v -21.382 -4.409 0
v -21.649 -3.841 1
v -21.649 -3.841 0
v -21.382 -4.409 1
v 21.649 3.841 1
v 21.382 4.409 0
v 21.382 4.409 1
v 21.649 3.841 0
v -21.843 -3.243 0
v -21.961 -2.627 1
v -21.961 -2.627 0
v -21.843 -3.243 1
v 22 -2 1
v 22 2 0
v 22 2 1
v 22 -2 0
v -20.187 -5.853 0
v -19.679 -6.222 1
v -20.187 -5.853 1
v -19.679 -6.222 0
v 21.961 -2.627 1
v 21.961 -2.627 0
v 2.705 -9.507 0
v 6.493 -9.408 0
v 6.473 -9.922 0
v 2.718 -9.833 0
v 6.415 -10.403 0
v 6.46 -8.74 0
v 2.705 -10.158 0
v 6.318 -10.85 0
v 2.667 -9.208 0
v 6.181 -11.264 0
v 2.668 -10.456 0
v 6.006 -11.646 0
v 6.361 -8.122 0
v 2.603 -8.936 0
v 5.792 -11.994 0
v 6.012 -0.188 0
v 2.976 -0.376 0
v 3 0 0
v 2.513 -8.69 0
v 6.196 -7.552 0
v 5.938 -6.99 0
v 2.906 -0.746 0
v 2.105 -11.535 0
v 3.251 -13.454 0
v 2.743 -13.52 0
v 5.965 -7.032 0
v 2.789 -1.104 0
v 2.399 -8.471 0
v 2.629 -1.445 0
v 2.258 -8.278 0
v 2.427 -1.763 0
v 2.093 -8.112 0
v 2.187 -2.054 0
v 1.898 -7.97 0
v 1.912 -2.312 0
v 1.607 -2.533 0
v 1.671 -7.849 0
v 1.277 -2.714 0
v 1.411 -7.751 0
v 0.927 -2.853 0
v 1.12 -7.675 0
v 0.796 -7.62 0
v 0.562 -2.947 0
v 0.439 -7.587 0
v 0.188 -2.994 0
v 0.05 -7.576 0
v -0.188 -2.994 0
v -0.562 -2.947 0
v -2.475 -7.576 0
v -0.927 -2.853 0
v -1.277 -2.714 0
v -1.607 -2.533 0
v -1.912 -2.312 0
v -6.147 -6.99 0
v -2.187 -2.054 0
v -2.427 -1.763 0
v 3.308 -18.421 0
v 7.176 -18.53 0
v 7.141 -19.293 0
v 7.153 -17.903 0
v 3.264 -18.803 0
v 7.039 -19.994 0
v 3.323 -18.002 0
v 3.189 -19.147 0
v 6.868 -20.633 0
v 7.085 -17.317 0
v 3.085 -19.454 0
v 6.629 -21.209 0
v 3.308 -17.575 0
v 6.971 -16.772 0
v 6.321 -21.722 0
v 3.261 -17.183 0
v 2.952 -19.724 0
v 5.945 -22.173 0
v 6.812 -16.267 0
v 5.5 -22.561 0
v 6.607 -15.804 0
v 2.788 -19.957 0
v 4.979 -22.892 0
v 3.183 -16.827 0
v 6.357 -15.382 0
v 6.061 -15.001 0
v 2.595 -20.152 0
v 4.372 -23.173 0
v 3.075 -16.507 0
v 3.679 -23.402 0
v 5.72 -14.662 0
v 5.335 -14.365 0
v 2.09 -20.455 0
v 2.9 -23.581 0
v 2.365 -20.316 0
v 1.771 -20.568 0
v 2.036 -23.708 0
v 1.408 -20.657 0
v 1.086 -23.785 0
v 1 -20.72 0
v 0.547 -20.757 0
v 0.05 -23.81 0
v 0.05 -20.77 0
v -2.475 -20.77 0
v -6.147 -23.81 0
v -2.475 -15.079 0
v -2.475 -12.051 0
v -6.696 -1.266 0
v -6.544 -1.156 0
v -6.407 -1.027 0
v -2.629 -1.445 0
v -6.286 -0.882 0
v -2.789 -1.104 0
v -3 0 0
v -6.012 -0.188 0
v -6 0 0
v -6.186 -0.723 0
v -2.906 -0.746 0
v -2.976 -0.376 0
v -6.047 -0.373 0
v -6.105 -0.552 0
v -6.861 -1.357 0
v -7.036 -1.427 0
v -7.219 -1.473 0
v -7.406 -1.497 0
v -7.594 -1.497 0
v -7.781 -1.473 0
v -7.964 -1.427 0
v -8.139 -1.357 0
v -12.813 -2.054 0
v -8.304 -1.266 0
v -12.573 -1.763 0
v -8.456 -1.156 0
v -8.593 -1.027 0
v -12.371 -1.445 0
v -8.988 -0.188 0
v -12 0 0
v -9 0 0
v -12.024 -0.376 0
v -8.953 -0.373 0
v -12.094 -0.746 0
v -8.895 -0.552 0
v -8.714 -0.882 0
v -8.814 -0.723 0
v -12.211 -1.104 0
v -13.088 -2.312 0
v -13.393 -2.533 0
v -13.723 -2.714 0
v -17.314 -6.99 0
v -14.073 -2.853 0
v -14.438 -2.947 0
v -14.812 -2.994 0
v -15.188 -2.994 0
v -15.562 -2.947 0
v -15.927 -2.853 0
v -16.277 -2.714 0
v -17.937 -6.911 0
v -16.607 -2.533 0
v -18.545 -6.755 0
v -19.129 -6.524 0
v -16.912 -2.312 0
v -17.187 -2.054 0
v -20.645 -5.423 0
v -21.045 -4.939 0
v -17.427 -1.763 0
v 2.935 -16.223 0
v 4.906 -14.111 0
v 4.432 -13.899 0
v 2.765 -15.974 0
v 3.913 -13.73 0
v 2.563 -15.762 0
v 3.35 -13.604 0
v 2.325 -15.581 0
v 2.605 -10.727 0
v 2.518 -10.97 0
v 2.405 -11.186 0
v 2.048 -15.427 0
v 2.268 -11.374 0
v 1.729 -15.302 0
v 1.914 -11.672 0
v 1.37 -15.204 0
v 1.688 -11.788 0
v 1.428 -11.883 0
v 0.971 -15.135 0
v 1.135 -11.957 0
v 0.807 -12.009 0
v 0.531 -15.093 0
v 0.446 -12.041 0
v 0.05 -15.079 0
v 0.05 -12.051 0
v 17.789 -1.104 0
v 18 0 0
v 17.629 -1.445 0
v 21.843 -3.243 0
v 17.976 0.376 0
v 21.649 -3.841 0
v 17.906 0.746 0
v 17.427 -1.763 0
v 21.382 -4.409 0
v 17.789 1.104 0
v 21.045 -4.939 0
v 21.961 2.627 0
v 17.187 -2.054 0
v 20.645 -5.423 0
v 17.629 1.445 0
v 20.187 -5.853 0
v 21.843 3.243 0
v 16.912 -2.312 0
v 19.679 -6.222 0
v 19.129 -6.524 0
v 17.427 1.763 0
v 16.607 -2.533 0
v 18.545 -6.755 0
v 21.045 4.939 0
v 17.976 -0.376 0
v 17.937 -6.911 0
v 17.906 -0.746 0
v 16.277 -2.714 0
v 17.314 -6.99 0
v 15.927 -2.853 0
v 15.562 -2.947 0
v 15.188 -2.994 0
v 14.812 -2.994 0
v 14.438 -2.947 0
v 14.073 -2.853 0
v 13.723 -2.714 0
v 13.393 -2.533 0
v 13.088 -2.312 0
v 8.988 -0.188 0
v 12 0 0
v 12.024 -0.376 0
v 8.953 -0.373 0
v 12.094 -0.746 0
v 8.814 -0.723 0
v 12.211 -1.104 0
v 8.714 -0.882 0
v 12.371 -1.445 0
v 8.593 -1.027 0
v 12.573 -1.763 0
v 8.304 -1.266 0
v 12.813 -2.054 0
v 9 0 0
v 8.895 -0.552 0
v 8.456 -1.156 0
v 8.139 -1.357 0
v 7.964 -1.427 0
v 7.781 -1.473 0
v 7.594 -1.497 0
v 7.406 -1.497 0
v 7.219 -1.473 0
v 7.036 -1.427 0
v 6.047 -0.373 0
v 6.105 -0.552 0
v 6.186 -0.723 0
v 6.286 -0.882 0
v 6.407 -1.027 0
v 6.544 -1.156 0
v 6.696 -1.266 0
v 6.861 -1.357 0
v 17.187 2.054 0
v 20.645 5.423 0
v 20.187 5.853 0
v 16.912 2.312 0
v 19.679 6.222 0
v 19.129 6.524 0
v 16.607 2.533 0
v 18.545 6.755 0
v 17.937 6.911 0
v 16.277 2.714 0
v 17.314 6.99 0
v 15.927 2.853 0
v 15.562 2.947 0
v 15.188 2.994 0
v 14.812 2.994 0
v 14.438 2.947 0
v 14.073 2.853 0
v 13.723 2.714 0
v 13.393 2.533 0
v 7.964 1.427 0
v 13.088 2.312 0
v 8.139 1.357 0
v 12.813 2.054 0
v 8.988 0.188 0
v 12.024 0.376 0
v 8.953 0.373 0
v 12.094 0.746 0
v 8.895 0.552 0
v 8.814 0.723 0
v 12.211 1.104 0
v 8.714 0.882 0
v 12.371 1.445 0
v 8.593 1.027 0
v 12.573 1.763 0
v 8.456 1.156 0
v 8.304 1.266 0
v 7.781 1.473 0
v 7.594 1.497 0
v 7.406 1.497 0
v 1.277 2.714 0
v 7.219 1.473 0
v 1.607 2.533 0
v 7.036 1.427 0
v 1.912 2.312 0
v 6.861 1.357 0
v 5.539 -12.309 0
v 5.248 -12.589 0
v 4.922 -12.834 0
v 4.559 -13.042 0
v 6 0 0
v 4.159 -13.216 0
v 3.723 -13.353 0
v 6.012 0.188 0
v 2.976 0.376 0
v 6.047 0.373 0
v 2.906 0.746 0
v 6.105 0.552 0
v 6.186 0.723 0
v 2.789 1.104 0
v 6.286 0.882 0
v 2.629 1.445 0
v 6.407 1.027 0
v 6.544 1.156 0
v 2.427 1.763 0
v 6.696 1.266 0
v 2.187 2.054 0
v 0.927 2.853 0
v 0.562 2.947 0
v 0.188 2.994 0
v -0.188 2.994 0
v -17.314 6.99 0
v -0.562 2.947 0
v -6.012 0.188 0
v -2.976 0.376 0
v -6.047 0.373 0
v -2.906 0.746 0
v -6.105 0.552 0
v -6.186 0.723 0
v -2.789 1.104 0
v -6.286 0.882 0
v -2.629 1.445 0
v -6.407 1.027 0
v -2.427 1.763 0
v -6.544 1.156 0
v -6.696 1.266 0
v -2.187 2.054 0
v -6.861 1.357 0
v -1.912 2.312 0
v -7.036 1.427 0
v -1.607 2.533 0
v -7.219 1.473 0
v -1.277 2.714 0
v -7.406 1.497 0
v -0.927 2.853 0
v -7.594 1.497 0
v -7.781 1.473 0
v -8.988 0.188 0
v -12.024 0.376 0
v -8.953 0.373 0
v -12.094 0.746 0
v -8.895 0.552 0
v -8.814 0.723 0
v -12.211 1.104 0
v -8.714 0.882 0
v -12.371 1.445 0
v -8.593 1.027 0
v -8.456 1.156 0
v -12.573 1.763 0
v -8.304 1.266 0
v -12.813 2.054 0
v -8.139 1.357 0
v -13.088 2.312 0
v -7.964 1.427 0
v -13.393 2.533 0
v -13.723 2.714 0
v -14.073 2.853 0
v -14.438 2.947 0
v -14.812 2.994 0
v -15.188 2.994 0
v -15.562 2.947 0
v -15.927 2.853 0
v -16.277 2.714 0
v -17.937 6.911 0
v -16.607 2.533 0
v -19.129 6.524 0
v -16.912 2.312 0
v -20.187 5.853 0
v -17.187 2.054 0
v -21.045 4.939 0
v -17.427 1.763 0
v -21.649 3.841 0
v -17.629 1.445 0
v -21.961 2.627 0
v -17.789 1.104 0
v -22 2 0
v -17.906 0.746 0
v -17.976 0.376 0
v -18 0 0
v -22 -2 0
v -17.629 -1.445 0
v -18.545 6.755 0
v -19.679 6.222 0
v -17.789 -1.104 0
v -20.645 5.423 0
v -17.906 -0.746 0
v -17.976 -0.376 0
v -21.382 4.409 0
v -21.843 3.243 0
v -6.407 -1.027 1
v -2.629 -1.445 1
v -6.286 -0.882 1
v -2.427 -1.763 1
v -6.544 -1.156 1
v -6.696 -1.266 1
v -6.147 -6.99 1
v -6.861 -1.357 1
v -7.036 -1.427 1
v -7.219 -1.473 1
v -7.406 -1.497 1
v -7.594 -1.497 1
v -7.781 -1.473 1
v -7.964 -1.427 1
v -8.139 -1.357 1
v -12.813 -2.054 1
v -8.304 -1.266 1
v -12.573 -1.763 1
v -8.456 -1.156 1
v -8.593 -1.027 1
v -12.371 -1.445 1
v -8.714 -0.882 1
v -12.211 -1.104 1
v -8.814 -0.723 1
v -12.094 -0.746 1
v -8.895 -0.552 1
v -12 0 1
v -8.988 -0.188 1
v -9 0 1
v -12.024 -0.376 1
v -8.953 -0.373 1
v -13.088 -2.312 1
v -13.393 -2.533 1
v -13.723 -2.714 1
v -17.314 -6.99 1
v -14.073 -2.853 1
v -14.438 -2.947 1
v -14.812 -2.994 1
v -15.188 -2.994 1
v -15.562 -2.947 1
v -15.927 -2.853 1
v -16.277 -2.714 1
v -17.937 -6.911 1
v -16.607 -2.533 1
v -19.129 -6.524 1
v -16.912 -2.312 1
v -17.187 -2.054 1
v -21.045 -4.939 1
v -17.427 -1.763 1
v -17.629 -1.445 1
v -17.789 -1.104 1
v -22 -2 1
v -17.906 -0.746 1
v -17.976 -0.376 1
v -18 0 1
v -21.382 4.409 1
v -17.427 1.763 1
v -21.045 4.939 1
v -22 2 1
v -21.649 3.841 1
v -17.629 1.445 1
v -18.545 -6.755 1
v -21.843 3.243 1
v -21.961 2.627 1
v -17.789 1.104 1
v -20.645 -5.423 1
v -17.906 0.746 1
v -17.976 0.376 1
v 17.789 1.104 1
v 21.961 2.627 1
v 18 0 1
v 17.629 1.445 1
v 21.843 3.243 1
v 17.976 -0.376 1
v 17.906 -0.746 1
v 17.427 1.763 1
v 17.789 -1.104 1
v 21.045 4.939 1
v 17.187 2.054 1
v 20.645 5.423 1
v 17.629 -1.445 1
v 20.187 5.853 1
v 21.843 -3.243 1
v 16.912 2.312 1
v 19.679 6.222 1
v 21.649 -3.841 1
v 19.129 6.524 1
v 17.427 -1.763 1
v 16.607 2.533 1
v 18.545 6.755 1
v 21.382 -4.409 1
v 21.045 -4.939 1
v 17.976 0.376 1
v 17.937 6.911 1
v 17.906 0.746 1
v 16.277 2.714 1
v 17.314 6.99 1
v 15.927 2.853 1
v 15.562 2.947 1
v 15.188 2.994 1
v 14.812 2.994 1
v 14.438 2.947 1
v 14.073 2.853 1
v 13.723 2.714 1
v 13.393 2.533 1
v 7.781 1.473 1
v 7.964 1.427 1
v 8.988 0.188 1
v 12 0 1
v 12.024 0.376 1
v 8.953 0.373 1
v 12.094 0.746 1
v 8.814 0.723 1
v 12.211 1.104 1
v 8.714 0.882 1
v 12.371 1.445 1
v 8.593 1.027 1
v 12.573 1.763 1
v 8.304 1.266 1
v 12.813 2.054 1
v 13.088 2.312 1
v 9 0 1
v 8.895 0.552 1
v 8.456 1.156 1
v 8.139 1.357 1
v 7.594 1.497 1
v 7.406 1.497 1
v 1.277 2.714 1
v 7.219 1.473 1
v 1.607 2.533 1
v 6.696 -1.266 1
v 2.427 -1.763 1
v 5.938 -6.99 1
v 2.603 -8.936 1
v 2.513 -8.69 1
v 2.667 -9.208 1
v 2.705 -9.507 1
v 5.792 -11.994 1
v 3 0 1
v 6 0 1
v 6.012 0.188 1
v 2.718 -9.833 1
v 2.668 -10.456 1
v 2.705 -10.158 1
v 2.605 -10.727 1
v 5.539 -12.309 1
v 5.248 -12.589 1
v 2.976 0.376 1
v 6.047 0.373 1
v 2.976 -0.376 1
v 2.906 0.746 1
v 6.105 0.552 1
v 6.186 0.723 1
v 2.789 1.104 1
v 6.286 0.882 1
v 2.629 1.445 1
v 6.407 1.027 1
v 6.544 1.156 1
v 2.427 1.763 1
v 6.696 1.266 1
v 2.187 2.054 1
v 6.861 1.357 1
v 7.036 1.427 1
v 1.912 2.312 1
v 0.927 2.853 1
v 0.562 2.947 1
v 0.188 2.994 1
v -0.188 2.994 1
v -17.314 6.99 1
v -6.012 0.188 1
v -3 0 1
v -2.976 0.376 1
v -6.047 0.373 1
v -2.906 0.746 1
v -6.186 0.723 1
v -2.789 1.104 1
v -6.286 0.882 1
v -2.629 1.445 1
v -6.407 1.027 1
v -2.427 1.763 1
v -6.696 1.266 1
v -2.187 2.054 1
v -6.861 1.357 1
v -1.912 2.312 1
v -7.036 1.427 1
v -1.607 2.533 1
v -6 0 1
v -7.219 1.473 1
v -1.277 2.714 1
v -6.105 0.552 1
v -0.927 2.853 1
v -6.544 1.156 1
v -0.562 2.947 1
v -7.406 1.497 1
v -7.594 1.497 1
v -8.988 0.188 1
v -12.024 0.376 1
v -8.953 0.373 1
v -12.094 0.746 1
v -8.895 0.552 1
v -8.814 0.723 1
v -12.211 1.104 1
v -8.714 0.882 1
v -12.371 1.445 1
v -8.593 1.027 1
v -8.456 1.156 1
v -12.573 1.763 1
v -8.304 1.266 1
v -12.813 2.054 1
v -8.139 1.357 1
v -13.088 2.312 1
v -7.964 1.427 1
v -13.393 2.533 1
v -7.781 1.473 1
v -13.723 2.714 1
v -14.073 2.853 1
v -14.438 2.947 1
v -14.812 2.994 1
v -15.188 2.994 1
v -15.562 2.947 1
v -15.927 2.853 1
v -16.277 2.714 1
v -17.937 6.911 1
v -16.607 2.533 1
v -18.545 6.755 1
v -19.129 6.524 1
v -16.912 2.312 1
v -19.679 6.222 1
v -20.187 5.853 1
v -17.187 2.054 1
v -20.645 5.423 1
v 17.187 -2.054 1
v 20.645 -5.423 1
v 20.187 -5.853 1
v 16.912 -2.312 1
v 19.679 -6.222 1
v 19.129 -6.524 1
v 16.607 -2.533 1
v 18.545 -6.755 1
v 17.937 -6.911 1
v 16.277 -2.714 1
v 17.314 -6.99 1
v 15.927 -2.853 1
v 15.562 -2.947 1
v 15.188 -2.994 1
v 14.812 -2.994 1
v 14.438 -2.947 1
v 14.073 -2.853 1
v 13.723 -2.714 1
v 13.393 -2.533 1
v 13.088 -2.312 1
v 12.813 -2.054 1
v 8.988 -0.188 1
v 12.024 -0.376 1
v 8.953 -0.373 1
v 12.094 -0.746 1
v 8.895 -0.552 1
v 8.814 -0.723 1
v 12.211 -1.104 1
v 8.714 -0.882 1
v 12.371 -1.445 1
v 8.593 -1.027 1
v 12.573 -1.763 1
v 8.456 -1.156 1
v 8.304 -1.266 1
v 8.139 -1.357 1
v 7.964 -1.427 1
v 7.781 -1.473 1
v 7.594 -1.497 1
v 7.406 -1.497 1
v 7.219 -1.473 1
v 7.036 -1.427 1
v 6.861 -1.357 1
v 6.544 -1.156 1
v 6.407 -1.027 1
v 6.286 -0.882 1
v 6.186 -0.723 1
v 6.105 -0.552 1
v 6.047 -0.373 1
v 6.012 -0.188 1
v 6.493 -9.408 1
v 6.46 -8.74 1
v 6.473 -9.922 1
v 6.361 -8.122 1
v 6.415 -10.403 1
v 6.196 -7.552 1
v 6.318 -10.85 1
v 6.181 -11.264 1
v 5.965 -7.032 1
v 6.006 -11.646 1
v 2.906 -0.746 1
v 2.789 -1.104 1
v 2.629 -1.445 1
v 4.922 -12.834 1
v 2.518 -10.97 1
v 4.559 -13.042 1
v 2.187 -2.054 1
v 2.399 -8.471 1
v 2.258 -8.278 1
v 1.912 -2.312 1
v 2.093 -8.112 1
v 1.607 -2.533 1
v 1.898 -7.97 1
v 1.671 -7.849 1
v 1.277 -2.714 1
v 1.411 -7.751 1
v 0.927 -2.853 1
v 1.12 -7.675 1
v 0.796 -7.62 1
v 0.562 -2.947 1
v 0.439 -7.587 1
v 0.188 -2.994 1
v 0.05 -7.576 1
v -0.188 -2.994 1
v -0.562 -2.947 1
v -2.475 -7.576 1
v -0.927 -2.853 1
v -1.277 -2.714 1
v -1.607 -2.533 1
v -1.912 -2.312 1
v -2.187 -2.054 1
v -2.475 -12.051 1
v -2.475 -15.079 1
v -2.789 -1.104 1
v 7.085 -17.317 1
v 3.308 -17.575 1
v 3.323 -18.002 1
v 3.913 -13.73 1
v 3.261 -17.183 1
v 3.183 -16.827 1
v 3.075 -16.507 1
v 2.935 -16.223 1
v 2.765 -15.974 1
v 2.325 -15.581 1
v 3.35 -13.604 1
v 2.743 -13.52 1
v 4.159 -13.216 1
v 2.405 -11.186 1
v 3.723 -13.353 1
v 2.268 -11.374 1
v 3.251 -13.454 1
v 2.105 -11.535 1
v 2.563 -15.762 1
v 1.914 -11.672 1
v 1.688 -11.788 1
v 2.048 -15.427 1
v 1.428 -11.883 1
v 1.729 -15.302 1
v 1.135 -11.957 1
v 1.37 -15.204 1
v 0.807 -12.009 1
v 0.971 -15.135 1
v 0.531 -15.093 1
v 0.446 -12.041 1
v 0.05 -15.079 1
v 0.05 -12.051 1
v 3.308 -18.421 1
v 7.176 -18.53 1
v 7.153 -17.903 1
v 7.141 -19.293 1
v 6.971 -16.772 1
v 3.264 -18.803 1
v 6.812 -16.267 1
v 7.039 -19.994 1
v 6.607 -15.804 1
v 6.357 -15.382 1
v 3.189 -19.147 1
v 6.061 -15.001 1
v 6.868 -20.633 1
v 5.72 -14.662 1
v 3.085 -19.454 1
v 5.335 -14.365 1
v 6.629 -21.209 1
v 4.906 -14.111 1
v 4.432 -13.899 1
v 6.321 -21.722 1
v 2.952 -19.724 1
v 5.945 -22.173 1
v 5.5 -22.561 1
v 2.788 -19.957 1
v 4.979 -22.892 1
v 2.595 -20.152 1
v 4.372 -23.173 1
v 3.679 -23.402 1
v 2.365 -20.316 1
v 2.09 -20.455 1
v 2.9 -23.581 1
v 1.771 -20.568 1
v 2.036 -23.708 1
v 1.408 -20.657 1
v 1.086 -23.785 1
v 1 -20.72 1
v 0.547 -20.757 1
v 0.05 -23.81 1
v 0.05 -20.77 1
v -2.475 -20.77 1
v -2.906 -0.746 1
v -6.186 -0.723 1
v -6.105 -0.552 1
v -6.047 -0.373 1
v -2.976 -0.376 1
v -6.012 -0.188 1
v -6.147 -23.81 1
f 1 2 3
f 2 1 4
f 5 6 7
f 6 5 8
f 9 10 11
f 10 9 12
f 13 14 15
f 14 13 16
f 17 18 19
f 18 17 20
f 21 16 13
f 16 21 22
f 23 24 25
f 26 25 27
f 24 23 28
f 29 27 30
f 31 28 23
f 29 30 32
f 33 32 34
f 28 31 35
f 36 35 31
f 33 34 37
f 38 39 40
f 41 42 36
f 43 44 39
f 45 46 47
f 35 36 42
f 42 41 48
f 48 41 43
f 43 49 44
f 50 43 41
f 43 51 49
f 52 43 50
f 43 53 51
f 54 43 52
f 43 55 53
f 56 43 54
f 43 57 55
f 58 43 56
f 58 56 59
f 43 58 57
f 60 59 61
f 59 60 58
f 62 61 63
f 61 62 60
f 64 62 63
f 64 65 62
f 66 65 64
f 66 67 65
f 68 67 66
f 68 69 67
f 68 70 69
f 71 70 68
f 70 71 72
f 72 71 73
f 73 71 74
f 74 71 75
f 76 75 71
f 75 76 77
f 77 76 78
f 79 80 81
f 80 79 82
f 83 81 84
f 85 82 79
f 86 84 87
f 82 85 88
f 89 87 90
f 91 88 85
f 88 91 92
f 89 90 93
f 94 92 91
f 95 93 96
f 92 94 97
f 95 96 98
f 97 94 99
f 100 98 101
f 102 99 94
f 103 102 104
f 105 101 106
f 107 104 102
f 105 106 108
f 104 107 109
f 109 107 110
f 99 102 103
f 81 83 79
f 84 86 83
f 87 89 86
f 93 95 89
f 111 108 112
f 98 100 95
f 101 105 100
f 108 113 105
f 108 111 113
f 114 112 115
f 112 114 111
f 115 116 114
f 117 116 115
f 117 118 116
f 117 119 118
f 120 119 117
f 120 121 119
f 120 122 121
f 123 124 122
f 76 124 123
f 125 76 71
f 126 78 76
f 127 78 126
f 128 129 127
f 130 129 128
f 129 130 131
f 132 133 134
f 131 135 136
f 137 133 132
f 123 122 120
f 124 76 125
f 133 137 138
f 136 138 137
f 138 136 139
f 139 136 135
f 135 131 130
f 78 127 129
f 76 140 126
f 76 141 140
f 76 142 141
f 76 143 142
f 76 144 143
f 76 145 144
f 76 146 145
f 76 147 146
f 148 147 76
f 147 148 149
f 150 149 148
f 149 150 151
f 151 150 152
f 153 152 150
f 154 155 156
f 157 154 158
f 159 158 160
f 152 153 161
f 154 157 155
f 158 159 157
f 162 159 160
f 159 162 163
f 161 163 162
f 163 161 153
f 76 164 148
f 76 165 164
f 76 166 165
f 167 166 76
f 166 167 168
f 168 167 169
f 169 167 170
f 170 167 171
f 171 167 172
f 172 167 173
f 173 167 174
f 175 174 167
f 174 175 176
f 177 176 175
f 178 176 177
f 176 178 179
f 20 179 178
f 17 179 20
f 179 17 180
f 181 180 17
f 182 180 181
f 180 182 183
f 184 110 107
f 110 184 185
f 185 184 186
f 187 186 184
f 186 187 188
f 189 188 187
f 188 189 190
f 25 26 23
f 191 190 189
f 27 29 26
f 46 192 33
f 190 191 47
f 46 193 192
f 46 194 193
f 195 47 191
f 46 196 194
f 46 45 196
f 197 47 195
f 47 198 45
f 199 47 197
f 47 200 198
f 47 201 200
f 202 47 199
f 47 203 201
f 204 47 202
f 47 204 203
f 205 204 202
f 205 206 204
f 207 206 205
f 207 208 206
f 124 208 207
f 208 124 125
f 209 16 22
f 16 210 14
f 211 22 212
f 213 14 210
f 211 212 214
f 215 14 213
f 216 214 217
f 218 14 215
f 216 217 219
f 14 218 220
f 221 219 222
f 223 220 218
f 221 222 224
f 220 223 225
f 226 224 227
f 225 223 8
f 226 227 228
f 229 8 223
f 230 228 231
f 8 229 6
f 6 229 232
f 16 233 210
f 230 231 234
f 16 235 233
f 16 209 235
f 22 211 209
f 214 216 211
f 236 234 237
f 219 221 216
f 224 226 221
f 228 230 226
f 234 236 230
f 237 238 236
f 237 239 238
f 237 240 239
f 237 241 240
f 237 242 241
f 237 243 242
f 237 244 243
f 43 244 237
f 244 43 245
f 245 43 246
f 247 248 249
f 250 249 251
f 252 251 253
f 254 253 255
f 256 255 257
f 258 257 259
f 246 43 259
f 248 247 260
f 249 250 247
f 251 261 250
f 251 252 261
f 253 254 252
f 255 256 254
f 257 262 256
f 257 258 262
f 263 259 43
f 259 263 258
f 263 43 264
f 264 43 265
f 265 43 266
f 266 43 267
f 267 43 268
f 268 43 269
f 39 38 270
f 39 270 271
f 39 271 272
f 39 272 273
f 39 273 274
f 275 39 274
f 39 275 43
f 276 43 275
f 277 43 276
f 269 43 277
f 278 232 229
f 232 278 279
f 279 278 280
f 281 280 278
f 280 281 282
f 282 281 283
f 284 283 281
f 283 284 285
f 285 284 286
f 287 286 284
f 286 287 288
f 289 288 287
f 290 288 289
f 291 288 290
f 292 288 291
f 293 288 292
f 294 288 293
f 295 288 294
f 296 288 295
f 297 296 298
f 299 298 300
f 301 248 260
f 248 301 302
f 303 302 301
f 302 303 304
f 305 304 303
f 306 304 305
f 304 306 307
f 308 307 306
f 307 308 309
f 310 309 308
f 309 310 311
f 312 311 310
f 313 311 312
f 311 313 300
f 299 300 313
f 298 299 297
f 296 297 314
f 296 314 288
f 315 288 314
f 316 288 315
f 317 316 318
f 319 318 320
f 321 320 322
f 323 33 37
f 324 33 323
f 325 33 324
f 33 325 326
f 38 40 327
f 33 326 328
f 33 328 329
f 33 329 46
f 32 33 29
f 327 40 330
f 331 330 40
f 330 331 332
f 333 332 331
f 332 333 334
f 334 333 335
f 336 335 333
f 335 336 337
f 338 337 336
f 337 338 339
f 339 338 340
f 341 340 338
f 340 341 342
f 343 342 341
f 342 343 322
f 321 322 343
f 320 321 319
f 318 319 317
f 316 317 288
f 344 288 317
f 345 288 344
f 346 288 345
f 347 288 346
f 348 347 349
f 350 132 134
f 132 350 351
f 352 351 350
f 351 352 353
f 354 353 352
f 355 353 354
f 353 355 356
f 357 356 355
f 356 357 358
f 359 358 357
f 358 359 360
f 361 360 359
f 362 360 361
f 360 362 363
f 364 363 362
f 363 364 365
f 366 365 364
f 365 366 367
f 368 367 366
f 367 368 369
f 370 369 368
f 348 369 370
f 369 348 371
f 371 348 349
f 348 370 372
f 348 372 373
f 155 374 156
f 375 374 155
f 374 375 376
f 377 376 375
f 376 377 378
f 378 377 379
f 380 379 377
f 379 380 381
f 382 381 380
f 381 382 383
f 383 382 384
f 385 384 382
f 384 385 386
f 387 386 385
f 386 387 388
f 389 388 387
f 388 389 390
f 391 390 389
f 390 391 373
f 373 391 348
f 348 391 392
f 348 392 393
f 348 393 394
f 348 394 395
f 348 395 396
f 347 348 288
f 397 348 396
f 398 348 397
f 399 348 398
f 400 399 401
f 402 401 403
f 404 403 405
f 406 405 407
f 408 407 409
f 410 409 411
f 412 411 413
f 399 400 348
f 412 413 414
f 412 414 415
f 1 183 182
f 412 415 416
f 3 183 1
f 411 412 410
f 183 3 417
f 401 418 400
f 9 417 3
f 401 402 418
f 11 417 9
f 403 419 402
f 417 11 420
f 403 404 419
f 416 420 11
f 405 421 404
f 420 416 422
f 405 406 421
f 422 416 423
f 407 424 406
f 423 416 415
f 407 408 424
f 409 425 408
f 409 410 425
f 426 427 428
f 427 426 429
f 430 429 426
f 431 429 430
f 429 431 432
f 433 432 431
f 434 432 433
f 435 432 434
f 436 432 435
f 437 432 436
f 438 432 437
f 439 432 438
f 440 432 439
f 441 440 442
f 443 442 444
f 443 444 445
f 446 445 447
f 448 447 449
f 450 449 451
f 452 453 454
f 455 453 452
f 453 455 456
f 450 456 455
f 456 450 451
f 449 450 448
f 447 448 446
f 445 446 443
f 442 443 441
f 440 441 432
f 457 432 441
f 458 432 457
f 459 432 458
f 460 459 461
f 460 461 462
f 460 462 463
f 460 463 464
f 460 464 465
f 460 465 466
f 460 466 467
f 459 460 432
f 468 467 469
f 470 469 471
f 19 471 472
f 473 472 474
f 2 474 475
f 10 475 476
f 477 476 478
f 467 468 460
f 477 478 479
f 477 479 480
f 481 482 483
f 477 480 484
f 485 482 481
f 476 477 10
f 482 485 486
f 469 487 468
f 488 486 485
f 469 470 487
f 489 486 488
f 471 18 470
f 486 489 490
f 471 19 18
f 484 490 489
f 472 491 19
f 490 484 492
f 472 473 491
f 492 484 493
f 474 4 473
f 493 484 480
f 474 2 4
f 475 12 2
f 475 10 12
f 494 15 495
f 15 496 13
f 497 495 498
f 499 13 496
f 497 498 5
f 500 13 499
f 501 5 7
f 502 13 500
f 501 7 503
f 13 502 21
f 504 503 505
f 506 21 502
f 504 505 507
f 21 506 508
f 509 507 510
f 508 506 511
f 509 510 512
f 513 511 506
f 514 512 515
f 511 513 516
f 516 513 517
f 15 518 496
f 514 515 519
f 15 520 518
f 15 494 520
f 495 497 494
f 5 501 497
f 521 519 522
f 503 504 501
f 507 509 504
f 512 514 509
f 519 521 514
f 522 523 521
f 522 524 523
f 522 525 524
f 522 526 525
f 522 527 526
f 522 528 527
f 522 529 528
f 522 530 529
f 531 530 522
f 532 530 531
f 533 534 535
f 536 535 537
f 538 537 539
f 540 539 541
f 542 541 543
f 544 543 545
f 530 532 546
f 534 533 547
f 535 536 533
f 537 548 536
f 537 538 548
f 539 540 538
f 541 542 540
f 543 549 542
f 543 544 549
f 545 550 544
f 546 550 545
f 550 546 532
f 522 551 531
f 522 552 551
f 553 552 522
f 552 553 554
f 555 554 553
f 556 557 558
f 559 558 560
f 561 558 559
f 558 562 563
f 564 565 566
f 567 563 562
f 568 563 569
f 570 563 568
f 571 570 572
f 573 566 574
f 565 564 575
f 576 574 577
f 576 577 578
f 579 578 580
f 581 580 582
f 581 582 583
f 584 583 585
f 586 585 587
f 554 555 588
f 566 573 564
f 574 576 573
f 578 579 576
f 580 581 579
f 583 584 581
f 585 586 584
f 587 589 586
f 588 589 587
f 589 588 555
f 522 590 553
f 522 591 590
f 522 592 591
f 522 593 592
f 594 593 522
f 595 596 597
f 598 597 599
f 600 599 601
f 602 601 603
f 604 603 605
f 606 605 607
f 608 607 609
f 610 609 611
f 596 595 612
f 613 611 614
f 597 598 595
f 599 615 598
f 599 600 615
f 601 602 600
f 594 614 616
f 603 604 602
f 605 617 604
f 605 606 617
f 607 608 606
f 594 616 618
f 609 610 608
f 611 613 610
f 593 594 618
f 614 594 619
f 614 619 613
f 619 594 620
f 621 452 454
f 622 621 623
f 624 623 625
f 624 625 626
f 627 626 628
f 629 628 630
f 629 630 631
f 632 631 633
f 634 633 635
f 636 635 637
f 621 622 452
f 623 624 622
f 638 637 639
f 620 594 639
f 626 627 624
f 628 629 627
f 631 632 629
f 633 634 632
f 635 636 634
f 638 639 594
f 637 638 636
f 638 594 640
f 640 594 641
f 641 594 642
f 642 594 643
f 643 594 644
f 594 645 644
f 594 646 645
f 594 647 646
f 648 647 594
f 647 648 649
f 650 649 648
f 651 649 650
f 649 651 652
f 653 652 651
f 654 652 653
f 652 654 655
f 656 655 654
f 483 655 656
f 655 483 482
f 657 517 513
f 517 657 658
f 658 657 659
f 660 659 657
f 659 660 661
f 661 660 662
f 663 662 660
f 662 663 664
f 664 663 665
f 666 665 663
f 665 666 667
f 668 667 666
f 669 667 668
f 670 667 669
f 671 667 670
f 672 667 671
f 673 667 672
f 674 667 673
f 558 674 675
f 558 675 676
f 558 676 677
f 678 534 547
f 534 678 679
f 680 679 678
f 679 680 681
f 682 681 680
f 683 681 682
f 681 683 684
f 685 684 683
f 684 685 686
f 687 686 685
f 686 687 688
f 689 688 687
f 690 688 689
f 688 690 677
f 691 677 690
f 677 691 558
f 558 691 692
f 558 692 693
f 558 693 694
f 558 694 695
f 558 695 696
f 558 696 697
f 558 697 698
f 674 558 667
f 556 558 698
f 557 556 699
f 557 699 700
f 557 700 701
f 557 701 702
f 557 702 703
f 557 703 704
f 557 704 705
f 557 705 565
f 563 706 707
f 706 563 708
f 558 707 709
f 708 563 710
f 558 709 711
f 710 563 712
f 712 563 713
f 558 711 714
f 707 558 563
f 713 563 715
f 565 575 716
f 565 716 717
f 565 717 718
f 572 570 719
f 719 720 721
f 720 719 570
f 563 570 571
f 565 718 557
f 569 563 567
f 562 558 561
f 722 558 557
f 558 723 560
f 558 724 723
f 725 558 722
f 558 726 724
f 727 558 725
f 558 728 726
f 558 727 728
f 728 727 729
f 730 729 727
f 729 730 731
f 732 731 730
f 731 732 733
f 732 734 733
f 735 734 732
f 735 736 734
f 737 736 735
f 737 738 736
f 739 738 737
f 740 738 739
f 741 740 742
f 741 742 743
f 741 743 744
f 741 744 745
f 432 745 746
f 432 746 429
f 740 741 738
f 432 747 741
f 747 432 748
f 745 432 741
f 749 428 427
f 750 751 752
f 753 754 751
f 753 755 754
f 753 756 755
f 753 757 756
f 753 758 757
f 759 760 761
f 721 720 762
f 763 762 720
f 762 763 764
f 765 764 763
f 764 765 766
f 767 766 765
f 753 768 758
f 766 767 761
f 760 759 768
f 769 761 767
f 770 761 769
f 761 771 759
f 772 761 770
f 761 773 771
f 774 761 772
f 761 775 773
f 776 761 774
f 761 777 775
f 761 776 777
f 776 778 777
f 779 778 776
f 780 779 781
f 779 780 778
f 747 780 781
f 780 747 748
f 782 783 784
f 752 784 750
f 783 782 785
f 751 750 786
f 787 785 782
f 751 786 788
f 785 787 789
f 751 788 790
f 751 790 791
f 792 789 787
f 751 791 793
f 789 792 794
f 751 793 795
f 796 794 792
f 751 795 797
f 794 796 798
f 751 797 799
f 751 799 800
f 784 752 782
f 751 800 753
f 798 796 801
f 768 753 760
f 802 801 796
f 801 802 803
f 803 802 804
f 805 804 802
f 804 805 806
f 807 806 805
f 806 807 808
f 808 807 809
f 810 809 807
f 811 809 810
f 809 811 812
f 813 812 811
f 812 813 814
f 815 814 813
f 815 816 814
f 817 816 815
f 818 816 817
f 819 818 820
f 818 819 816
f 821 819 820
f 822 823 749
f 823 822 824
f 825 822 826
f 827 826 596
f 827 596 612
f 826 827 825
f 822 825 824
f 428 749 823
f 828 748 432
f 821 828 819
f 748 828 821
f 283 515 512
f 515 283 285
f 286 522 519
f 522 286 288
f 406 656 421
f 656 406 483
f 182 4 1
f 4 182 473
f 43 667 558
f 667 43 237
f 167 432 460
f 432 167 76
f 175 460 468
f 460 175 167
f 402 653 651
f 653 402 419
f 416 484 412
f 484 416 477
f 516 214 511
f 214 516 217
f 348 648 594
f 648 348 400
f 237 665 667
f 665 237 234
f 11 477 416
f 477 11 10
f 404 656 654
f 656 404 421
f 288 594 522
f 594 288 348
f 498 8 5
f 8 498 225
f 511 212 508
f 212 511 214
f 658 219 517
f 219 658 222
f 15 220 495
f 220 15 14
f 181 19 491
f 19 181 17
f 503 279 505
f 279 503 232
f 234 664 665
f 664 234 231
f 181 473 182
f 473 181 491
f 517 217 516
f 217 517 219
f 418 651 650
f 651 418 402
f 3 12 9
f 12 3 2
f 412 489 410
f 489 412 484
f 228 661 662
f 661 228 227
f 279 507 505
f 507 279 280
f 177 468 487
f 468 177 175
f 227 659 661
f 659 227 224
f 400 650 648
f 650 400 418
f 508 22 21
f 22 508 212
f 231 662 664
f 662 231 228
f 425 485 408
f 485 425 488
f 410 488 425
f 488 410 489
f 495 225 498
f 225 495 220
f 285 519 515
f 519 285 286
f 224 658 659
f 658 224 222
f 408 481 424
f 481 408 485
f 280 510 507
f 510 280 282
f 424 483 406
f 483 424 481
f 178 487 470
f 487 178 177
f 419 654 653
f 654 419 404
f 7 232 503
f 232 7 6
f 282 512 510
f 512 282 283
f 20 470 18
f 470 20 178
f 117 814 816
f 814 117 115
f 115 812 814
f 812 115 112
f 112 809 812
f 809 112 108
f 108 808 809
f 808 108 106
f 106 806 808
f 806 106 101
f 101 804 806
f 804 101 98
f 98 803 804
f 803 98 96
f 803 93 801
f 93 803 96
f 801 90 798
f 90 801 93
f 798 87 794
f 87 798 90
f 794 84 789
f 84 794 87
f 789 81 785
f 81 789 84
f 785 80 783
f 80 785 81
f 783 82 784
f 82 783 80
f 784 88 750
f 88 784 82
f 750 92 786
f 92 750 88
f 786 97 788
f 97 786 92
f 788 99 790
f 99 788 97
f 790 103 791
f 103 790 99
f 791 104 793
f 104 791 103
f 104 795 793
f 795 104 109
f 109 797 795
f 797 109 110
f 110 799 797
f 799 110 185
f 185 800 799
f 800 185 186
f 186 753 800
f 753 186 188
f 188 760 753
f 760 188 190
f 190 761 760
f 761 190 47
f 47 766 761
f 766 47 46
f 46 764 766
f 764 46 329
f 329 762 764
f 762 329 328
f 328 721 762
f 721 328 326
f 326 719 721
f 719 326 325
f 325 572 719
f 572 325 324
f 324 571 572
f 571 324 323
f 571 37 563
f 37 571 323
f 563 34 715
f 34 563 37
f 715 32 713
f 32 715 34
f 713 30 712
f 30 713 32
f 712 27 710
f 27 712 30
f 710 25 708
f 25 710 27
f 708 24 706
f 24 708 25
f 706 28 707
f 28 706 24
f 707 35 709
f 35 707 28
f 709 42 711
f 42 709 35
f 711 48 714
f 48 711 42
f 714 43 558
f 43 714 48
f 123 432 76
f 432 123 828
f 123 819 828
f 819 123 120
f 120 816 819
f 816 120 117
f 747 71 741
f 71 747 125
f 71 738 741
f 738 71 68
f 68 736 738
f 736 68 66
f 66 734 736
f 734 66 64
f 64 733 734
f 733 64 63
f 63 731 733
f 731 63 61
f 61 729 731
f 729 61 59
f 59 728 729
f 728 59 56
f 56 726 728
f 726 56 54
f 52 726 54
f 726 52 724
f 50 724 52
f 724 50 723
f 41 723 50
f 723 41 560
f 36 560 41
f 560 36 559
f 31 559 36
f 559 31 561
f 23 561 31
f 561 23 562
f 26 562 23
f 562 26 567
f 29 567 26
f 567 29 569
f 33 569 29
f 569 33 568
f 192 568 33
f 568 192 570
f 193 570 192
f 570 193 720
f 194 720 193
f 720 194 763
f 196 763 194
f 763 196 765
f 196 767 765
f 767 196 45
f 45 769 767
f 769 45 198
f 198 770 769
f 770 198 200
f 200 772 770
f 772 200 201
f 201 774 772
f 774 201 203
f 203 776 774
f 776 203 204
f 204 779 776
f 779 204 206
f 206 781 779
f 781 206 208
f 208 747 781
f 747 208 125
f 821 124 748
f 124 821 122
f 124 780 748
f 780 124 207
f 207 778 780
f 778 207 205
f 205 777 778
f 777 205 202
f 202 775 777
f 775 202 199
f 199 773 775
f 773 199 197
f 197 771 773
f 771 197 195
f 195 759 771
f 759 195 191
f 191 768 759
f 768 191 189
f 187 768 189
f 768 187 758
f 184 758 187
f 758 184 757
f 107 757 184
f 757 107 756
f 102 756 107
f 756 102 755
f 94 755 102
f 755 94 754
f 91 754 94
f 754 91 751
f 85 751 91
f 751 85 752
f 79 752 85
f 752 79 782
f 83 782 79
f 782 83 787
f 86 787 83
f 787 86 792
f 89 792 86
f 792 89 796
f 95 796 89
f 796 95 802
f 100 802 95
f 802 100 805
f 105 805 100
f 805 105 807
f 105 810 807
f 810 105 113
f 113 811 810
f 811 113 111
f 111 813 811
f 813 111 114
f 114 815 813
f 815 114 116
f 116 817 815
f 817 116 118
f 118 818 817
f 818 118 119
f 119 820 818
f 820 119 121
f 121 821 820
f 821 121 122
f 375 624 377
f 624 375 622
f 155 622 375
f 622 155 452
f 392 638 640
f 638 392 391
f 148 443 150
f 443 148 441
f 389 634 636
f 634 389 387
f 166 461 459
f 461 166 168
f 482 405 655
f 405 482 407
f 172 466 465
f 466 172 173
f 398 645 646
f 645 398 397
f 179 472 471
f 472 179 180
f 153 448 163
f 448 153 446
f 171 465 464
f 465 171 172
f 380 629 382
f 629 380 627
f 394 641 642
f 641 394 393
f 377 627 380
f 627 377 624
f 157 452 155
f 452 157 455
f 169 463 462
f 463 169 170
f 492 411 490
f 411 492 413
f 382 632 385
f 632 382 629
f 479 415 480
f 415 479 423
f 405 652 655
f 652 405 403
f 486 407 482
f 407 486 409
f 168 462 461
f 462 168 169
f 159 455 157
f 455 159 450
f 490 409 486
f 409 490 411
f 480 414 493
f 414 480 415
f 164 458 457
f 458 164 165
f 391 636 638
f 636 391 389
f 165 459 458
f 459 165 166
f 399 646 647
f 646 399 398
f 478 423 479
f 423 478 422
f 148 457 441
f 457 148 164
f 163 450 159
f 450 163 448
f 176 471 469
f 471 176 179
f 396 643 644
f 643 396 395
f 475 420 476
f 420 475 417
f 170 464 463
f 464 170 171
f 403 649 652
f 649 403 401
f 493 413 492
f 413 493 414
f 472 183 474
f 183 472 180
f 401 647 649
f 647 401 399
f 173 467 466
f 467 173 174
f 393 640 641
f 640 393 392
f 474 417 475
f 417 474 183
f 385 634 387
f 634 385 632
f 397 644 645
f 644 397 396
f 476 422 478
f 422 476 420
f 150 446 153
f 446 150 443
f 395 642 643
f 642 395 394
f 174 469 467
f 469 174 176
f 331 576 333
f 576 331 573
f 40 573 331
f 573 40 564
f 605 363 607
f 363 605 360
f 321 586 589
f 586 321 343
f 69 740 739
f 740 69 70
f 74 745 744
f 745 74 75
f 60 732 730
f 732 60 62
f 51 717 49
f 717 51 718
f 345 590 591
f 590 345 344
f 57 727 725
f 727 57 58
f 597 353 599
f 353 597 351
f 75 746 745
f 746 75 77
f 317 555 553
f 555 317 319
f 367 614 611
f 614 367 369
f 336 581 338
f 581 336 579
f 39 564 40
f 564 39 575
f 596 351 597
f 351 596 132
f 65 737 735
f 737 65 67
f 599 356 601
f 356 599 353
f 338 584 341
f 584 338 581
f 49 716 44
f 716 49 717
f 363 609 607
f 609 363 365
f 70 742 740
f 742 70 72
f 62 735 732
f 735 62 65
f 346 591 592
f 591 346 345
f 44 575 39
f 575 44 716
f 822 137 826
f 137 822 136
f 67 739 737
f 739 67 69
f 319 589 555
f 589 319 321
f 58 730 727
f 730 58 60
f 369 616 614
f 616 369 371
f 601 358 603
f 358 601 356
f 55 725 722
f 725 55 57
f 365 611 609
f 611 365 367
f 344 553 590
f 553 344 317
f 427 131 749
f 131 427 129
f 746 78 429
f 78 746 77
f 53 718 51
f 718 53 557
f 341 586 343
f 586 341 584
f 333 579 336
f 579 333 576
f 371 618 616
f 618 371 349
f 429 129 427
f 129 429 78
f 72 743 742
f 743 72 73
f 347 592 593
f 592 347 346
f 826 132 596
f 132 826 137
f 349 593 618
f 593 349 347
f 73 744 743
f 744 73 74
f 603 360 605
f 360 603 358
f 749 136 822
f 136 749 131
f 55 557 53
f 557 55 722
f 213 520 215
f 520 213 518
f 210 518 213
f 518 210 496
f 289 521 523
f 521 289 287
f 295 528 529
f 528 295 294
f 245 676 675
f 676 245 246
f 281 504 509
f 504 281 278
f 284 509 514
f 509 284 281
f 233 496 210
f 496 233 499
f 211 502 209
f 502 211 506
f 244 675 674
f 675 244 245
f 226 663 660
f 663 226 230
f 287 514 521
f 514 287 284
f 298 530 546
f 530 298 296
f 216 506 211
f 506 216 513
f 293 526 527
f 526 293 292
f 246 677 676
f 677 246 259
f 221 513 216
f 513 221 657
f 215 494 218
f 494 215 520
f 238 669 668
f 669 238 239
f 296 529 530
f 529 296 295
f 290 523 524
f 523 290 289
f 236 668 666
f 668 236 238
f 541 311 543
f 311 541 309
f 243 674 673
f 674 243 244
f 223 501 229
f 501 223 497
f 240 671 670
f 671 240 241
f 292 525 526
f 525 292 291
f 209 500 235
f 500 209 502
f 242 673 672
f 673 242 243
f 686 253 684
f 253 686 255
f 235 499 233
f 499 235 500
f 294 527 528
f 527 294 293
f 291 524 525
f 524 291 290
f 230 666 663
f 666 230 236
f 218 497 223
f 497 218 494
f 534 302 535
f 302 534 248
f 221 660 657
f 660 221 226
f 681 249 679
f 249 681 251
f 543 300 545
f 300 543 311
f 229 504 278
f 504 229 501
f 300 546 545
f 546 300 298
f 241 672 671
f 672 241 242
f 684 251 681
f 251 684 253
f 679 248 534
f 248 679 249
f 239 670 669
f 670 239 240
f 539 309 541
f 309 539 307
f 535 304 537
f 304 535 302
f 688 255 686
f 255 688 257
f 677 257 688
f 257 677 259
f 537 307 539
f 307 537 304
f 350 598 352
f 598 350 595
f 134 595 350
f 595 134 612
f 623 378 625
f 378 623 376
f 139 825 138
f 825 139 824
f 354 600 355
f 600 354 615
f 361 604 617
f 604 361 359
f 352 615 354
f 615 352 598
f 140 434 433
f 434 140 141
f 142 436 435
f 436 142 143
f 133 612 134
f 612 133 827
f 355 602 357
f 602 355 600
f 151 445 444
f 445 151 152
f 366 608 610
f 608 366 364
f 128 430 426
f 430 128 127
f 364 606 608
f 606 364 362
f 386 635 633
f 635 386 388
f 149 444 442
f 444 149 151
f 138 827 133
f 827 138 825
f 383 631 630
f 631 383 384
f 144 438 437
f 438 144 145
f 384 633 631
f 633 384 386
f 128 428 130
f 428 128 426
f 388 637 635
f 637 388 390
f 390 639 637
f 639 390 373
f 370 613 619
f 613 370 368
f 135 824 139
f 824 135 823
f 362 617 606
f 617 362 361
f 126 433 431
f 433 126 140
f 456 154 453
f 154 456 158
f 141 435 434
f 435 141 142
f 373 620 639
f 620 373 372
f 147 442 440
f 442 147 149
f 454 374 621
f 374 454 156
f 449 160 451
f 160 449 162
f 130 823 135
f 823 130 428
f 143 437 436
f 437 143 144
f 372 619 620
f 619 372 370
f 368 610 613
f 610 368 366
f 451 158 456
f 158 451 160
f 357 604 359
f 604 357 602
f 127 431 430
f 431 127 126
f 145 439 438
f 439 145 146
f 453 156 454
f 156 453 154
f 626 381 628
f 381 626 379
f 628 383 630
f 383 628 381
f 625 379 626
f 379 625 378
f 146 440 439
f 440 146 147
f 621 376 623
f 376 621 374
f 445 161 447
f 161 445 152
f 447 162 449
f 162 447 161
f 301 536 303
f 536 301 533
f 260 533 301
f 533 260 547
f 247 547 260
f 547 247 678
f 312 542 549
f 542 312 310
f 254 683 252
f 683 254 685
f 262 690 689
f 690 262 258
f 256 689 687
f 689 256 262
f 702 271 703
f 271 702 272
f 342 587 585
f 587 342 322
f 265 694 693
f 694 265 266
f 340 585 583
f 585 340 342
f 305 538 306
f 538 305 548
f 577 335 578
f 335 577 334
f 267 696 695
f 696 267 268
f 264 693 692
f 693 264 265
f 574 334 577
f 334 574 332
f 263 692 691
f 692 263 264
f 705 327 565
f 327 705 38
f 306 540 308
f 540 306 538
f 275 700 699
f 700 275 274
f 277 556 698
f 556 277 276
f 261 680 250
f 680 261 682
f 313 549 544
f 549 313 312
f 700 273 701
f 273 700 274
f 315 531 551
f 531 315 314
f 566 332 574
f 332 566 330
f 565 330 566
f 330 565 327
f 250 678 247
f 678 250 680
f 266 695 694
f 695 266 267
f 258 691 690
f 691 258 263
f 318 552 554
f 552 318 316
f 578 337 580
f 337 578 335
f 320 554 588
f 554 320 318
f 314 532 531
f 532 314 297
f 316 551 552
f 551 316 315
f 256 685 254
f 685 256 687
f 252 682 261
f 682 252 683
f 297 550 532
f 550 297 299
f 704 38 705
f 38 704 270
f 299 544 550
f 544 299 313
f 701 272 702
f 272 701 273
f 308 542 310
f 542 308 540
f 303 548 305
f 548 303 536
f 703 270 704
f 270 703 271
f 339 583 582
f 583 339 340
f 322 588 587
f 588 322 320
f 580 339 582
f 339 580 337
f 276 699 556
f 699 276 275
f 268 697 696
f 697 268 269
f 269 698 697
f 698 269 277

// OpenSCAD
$fn = 50;


difference() {
	union() {
		*color(alpha = 1.0000000000, c = "gray") {
			translate(v = [0, 14, 0]) {
				linear_extrude(height = 1) {
					text(font = "Arial:style=Bold", halign = "center", size = 4.5000000000, text = "COMMENT description oobb_plate_shape_p_type_1_depth_3_width_1_thickness_b_extra_oobb_size", valign = "center");
				}
			}
		}
		hull() {
			translate(v = [-17.0000000000, 2.0000000000, 0]) {
				cylinder(h = 1, r = 5);
			}
			translate(v = [17.0000000000, 2.0000000000, 0]) {
				cylinder(h = 1, r = 5);
			}
			translate(v = [-17.0000000000, -2.0000000000, 0]) {
				cylinder(h = 1, r = 5);
			}
			translate(v = [17.0000000000, -2.0000000000, 0]) {
				cylinder(h = 1, r = 5);
			}
		}
		translate(v = [0, -5, 0]) {
			linear_extrude(height = 1) {
				text(font = "DejaVu Sans Mono:style=Bold", halign = "center", size = 19.0000000000, text = "B", valign = "top");
			}
		}
	}
	union() {
		*color(alpha = 1.0000000000, c = "gray") {
			translate(v = [0, 14, 0]) {
				linear_extrude(height = 1) {
					text(font = "Arial:style=Bold", halign = "center", size = 4.5000000000, text = "COMMENT description oobb_holes_shape_n_type_3_width_1_thickness_b_extra_oobb_size_1_height_'all'_holes_true_both_holes", valign = "center");
				}
			}
		}
		translate(v = [-15.0000000000, 0.0000000000, 0]) {
			translate(v = [0, 0, -50]) {
				cylinder(h = 100, r = 3.0000000000);
			}
		}
		translate(v = [0, 0, -50]) {
			cylinder(h = 100, r = 3.0000000000);
		}
		translate(v = [15.0000000000, 0.0000000000, 0]) {
			translate(v = [0, 0, -50]) {
				cylinder(h = 100, r = 3.0000000000);
			}
		}
		translate(v = [-15.0000000000, 0.0000000000, 0]) {
			translate(v = [0, 0, -50]) {
				cylinder(h = 100, r = 1.5000000000);
			}
		}
		translate(v = [-7.5000000000, 0.0000000000, 0]) {
			translate(v = [0, 0, -50]) {
				cylinder(h = 100, r = 1.5000000000);
			}
		}
		translate(v = [0, 0, -50]) {
			cylinder(h = 100, r = 1.5000000000);
		}
		translate(v = [7.5000000000, 0.0000000000, 0]) {
			translate(v = [0, 0, -50]) {
				cylinder(h = 100, r = 1.5000000000);
			}
		}
		translate(v = [15.0000000000, 0.0000000000, 0]) {
			translate(v = [0, 0, -50]) {
				cylinder(h = 100, r = 1.5000000000);
			}
		}
	}
}
